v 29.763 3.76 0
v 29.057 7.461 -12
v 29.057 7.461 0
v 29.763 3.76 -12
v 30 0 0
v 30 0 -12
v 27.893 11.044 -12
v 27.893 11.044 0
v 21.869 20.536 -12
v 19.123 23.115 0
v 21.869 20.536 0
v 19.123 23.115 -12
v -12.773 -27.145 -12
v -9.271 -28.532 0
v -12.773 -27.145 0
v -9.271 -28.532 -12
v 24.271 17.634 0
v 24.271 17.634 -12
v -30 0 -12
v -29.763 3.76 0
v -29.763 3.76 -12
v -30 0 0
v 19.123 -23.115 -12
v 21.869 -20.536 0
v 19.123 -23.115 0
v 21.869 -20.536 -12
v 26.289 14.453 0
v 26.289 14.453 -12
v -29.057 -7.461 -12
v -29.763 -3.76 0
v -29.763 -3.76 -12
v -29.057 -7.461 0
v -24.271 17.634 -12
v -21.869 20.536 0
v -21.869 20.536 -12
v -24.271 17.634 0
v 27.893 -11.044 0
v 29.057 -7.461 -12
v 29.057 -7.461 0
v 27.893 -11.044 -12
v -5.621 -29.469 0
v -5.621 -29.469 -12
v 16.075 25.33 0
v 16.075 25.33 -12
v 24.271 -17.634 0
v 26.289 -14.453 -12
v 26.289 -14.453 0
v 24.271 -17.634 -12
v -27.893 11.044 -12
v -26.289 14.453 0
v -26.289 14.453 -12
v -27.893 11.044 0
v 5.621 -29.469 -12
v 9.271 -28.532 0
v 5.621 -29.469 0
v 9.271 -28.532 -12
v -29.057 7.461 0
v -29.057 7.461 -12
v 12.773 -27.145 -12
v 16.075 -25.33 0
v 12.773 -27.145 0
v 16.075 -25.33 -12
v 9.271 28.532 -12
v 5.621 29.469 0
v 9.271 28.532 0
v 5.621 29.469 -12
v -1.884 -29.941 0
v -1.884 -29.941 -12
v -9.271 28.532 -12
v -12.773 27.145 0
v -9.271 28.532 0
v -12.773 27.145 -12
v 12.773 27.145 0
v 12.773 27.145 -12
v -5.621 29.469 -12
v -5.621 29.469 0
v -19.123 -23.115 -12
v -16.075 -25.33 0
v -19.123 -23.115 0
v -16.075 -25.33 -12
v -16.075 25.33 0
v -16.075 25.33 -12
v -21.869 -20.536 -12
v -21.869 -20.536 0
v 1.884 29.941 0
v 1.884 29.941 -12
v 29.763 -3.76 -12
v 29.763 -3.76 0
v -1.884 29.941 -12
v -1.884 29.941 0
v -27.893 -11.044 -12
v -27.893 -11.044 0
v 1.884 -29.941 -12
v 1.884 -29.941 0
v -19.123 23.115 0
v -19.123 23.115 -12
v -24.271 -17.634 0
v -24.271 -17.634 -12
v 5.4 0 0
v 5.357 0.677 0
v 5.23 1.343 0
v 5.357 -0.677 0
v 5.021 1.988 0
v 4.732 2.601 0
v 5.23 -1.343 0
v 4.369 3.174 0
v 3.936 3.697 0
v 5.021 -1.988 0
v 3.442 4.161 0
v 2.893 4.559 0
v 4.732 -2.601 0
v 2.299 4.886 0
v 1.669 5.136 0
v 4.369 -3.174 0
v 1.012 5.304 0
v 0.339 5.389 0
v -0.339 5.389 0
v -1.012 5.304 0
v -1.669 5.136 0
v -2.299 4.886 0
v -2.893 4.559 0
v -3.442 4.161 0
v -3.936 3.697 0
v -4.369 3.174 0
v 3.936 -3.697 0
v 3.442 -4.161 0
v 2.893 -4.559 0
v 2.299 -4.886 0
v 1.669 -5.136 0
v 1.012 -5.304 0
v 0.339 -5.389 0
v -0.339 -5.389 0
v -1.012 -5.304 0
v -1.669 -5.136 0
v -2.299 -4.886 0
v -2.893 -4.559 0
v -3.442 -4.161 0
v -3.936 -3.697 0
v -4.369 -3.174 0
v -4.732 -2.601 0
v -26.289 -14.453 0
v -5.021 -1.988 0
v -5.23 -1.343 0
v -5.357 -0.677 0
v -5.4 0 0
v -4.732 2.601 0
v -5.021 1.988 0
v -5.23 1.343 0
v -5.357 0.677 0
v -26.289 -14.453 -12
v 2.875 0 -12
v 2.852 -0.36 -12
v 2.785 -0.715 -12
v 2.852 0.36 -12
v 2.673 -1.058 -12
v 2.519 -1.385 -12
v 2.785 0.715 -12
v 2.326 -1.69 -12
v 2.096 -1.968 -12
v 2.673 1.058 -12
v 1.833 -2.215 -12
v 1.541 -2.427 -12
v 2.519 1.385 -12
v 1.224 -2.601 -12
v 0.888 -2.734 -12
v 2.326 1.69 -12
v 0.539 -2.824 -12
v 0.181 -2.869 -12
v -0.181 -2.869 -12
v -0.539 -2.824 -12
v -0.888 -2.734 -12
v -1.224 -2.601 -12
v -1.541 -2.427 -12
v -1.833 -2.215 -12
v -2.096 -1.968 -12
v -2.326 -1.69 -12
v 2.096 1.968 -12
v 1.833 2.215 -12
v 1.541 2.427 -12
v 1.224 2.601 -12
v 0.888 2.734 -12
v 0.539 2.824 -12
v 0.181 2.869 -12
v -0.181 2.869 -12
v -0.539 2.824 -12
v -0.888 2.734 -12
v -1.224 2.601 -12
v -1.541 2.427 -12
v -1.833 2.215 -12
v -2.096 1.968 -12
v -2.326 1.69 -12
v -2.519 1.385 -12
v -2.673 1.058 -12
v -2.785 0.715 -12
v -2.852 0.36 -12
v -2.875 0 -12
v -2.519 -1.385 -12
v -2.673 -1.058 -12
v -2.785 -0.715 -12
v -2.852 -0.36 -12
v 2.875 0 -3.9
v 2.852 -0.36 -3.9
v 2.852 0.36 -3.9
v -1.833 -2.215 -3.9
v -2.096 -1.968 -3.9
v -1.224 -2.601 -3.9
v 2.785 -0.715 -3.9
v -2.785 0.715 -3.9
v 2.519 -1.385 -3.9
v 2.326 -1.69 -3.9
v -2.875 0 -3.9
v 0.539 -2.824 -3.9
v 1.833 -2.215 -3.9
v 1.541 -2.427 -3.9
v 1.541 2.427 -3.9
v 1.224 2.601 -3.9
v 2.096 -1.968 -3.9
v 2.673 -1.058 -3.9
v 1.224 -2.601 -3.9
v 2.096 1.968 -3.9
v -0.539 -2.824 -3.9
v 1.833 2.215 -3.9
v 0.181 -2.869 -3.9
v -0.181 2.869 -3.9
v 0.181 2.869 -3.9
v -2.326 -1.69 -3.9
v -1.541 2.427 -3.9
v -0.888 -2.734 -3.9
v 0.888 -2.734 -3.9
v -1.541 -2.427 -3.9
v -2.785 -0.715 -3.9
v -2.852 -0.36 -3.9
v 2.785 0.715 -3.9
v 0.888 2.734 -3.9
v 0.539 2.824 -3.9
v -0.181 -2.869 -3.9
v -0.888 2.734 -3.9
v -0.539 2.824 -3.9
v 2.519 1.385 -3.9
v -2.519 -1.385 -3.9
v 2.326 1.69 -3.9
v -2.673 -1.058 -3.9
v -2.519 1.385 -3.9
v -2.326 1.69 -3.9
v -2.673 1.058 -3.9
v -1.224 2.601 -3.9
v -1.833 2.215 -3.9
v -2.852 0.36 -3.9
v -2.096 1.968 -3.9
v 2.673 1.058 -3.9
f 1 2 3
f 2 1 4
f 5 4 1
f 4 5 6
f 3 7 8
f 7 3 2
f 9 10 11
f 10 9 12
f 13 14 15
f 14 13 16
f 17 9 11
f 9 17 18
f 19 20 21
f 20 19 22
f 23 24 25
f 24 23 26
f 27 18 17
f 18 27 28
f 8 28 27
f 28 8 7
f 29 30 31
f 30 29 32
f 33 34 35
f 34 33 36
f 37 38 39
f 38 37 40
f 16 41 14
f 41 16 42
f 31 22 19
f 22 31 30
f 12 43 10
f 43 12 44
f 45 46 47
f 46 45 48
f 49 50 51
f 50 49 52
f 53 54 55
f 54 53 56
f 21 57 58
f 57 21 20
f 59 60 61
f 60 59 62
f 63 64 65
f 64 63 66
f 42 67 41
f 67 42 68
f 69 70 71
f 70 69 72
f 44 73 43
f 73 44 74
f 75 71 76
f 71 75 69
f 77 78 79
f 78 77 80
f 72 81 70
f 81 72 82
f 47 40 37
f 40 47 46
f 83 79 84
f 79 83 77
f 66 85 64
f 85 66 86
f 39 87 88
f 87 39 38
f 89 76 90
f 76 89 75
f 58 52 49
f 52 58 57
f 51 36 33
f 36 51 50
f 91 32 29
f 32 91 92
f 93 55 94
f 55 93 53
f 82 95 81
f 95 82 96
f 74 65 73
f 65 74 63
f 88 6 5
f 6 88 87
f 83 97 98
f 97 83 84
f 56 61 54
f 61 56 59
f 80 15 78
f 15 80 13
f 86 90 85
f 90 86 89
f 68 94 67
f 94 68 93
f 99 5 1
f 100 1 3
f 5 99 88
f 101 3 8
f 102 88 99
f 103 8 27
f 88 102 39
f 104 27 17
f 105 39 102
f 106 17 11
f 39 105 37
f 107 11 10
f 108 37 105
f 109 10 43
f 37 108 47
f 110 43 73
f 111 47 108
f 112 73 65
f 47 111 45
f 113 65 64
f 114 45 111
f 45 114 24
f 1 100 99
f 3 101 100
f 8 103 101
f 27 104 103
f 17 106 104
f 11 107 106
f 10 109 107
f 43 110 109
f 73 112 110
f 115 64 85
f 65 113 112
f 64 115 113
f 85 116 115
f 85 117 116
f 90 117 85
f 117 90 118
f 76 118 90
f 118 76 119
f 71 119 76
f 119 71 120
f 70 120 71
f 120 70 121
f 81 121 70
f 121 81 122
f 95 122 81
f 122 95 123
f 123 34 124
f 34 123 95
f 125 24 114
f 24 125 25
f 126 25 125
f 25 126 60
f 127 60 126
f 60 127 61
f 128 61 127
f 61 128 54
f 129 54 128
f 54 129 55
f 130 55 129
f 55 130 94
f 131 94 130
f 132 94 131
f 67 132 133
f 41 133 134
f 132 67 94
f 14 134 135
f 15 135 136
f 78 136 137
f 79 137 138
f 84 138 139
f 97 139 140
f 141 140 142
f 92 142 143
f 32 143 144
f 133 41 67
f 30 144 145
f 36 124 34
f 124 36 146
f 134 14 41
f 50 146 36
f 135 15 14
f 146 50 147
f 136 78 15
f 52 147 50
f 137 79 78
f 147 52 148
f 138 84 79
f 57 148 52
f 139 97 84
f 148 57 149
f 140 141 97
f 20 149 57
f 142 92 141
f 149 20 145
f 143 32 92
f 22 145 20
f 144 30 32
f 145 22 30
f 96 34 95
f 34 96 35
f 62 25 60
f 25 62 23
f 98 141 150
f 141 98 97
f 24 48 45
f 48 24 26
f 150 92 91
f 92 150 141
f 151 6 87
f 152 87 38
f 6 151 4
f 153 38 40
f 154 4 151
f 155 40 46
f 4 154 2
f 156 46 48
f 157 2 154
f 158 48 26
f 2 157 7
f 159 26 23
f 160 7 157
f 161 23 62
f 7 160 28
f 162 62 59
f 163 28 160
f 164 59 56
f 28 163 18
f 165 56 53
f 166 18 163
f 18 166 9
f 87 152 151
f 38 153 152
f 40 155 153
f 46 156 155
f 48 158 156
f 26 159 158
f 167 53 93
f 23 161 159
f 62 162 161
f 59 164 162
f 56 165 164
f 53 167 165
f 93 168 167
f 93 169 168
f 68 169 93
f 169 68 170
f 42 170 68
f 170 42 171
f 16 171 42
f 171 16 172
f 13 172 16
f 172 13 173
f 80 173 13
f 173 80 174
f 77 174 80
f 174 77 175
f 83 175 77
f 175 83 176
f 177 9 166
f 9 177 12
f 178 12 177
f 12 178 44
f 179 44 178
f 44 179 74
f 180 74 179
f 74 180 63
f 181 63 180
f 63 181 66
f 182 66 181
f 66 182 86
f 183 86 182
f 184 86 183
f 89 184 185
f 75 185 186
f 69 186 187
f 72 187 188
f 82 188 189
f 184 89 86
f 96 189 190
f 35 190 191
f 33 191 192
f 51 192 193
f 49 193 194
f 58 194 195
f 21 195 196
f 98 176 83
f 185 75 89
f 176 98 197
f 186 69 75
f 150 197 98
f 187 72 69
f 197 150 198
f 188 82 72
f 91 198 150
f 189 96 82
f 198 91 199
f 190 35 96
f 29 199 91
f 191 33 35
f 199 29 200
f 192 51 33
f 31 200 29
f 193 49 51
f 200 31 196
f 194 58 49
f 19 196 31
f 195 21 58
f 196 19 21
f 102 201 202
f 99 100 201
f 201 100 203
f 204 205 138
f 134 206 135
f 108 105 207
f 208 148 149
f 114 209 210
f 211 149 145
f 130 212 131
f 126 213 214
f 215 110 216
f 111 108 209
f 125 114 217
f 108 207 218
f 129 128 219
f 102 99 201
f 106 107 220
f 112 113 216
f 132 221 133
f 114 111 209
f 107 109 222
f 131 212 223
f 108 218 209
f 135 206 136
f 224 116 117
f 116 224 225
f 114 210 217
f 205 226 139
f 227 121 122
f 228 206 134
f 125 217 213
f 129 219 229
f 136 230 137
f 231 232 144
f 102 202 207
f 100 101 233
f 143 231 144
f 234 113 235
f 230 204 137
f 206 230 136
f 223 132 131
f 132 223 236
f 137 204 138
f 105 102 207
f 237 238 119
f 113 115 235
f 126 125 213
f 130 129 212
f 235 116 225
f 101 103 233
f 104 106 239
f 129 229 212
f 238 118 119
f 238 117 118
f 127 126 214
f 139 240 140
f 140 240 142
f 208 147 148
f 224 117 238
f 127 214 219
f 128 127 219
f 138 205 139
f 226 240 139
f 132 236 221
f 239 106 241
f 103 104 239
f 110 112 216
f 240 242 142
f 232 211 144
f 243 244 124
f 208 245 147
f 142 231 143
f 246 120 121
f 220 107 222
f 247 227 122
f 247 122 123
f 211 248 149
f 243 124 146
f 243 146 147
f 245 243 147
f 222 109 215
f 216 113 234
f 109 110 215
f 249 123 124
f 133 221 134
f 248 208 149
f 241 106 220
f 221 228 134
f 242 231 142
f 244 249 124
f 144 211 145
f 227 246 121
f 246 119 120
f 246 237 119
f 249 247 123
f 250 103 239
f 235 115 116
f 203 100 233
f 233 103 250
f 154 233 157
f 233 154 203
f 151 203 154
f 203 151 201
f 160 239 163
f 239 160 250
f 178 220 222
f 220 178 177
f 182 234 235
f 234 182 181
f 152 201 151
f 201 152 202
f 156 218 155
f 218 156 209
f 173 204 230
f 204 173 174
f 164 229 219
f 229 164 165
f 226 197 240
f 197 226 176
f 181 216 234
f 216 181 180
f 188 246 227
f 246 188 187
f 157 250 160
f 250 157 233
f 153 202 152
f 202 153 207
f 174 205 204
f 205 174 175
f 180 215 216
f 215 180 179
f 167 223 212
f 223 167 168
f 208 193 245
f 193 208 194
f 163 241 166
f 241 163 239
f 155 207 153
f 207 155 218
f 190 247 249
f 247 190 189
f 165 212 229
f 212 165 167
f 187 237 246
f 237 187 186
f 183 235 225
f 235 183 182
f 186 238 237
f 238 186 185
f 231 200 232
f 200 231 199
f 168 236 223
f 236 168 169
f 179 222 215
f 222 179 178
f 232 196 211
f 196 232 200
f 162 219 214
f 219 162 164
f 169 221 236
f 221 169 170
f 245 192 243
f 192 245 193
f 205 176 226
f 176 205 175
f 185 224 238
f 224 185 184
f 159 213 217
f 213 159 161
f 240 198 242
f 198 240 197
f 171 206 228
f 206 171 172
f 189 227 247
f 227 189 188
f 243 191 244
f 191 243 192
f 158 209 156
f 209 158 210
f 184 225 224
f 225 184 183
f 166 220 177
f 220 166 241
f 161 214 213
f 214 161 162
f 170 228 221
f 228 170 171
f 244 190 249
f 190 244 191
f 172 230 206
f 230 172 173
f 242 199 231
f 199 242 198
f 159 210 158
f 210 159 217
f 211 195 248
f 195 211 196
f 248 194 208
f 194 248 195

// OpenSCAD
$fn = 50;


difference() {
	union() {
		translate(v = [0, 0, -12.0000000000]) {
			cylinder(h = 12, r = 30.0000000000);
		}
		translate(v = [0, 0, -12.0000000000]) {
			cylinder(h = 12, r = 2.8750000000);
		}
	}
	union() {
		translate(v = [0, 0, 0]) {
			rotate(a = [0, 0, 0]) {
				difference() {
					union() {
						translate(v = [0, 0, -12.0000000000]) {
							cylinder(h = 12, r = 2.6000000000);
						}
						translate(v = [0, 0, -3.9000000000]) {
							cylinder(h = 3.9000000000, r1 = 2.8750000000, r2 = 5.4000000000);
						}
						translate(v = [0, 0, -12.0000000000]) {
							cylinder(h = 12, r = 2.8750000000);
						}
						translate(v = [0, 0, -12.0000000000]) {
							cylinder(h = 12, r = 2.6000000000);
						}
					}
					union();
				}
			}
		}
	}
}
